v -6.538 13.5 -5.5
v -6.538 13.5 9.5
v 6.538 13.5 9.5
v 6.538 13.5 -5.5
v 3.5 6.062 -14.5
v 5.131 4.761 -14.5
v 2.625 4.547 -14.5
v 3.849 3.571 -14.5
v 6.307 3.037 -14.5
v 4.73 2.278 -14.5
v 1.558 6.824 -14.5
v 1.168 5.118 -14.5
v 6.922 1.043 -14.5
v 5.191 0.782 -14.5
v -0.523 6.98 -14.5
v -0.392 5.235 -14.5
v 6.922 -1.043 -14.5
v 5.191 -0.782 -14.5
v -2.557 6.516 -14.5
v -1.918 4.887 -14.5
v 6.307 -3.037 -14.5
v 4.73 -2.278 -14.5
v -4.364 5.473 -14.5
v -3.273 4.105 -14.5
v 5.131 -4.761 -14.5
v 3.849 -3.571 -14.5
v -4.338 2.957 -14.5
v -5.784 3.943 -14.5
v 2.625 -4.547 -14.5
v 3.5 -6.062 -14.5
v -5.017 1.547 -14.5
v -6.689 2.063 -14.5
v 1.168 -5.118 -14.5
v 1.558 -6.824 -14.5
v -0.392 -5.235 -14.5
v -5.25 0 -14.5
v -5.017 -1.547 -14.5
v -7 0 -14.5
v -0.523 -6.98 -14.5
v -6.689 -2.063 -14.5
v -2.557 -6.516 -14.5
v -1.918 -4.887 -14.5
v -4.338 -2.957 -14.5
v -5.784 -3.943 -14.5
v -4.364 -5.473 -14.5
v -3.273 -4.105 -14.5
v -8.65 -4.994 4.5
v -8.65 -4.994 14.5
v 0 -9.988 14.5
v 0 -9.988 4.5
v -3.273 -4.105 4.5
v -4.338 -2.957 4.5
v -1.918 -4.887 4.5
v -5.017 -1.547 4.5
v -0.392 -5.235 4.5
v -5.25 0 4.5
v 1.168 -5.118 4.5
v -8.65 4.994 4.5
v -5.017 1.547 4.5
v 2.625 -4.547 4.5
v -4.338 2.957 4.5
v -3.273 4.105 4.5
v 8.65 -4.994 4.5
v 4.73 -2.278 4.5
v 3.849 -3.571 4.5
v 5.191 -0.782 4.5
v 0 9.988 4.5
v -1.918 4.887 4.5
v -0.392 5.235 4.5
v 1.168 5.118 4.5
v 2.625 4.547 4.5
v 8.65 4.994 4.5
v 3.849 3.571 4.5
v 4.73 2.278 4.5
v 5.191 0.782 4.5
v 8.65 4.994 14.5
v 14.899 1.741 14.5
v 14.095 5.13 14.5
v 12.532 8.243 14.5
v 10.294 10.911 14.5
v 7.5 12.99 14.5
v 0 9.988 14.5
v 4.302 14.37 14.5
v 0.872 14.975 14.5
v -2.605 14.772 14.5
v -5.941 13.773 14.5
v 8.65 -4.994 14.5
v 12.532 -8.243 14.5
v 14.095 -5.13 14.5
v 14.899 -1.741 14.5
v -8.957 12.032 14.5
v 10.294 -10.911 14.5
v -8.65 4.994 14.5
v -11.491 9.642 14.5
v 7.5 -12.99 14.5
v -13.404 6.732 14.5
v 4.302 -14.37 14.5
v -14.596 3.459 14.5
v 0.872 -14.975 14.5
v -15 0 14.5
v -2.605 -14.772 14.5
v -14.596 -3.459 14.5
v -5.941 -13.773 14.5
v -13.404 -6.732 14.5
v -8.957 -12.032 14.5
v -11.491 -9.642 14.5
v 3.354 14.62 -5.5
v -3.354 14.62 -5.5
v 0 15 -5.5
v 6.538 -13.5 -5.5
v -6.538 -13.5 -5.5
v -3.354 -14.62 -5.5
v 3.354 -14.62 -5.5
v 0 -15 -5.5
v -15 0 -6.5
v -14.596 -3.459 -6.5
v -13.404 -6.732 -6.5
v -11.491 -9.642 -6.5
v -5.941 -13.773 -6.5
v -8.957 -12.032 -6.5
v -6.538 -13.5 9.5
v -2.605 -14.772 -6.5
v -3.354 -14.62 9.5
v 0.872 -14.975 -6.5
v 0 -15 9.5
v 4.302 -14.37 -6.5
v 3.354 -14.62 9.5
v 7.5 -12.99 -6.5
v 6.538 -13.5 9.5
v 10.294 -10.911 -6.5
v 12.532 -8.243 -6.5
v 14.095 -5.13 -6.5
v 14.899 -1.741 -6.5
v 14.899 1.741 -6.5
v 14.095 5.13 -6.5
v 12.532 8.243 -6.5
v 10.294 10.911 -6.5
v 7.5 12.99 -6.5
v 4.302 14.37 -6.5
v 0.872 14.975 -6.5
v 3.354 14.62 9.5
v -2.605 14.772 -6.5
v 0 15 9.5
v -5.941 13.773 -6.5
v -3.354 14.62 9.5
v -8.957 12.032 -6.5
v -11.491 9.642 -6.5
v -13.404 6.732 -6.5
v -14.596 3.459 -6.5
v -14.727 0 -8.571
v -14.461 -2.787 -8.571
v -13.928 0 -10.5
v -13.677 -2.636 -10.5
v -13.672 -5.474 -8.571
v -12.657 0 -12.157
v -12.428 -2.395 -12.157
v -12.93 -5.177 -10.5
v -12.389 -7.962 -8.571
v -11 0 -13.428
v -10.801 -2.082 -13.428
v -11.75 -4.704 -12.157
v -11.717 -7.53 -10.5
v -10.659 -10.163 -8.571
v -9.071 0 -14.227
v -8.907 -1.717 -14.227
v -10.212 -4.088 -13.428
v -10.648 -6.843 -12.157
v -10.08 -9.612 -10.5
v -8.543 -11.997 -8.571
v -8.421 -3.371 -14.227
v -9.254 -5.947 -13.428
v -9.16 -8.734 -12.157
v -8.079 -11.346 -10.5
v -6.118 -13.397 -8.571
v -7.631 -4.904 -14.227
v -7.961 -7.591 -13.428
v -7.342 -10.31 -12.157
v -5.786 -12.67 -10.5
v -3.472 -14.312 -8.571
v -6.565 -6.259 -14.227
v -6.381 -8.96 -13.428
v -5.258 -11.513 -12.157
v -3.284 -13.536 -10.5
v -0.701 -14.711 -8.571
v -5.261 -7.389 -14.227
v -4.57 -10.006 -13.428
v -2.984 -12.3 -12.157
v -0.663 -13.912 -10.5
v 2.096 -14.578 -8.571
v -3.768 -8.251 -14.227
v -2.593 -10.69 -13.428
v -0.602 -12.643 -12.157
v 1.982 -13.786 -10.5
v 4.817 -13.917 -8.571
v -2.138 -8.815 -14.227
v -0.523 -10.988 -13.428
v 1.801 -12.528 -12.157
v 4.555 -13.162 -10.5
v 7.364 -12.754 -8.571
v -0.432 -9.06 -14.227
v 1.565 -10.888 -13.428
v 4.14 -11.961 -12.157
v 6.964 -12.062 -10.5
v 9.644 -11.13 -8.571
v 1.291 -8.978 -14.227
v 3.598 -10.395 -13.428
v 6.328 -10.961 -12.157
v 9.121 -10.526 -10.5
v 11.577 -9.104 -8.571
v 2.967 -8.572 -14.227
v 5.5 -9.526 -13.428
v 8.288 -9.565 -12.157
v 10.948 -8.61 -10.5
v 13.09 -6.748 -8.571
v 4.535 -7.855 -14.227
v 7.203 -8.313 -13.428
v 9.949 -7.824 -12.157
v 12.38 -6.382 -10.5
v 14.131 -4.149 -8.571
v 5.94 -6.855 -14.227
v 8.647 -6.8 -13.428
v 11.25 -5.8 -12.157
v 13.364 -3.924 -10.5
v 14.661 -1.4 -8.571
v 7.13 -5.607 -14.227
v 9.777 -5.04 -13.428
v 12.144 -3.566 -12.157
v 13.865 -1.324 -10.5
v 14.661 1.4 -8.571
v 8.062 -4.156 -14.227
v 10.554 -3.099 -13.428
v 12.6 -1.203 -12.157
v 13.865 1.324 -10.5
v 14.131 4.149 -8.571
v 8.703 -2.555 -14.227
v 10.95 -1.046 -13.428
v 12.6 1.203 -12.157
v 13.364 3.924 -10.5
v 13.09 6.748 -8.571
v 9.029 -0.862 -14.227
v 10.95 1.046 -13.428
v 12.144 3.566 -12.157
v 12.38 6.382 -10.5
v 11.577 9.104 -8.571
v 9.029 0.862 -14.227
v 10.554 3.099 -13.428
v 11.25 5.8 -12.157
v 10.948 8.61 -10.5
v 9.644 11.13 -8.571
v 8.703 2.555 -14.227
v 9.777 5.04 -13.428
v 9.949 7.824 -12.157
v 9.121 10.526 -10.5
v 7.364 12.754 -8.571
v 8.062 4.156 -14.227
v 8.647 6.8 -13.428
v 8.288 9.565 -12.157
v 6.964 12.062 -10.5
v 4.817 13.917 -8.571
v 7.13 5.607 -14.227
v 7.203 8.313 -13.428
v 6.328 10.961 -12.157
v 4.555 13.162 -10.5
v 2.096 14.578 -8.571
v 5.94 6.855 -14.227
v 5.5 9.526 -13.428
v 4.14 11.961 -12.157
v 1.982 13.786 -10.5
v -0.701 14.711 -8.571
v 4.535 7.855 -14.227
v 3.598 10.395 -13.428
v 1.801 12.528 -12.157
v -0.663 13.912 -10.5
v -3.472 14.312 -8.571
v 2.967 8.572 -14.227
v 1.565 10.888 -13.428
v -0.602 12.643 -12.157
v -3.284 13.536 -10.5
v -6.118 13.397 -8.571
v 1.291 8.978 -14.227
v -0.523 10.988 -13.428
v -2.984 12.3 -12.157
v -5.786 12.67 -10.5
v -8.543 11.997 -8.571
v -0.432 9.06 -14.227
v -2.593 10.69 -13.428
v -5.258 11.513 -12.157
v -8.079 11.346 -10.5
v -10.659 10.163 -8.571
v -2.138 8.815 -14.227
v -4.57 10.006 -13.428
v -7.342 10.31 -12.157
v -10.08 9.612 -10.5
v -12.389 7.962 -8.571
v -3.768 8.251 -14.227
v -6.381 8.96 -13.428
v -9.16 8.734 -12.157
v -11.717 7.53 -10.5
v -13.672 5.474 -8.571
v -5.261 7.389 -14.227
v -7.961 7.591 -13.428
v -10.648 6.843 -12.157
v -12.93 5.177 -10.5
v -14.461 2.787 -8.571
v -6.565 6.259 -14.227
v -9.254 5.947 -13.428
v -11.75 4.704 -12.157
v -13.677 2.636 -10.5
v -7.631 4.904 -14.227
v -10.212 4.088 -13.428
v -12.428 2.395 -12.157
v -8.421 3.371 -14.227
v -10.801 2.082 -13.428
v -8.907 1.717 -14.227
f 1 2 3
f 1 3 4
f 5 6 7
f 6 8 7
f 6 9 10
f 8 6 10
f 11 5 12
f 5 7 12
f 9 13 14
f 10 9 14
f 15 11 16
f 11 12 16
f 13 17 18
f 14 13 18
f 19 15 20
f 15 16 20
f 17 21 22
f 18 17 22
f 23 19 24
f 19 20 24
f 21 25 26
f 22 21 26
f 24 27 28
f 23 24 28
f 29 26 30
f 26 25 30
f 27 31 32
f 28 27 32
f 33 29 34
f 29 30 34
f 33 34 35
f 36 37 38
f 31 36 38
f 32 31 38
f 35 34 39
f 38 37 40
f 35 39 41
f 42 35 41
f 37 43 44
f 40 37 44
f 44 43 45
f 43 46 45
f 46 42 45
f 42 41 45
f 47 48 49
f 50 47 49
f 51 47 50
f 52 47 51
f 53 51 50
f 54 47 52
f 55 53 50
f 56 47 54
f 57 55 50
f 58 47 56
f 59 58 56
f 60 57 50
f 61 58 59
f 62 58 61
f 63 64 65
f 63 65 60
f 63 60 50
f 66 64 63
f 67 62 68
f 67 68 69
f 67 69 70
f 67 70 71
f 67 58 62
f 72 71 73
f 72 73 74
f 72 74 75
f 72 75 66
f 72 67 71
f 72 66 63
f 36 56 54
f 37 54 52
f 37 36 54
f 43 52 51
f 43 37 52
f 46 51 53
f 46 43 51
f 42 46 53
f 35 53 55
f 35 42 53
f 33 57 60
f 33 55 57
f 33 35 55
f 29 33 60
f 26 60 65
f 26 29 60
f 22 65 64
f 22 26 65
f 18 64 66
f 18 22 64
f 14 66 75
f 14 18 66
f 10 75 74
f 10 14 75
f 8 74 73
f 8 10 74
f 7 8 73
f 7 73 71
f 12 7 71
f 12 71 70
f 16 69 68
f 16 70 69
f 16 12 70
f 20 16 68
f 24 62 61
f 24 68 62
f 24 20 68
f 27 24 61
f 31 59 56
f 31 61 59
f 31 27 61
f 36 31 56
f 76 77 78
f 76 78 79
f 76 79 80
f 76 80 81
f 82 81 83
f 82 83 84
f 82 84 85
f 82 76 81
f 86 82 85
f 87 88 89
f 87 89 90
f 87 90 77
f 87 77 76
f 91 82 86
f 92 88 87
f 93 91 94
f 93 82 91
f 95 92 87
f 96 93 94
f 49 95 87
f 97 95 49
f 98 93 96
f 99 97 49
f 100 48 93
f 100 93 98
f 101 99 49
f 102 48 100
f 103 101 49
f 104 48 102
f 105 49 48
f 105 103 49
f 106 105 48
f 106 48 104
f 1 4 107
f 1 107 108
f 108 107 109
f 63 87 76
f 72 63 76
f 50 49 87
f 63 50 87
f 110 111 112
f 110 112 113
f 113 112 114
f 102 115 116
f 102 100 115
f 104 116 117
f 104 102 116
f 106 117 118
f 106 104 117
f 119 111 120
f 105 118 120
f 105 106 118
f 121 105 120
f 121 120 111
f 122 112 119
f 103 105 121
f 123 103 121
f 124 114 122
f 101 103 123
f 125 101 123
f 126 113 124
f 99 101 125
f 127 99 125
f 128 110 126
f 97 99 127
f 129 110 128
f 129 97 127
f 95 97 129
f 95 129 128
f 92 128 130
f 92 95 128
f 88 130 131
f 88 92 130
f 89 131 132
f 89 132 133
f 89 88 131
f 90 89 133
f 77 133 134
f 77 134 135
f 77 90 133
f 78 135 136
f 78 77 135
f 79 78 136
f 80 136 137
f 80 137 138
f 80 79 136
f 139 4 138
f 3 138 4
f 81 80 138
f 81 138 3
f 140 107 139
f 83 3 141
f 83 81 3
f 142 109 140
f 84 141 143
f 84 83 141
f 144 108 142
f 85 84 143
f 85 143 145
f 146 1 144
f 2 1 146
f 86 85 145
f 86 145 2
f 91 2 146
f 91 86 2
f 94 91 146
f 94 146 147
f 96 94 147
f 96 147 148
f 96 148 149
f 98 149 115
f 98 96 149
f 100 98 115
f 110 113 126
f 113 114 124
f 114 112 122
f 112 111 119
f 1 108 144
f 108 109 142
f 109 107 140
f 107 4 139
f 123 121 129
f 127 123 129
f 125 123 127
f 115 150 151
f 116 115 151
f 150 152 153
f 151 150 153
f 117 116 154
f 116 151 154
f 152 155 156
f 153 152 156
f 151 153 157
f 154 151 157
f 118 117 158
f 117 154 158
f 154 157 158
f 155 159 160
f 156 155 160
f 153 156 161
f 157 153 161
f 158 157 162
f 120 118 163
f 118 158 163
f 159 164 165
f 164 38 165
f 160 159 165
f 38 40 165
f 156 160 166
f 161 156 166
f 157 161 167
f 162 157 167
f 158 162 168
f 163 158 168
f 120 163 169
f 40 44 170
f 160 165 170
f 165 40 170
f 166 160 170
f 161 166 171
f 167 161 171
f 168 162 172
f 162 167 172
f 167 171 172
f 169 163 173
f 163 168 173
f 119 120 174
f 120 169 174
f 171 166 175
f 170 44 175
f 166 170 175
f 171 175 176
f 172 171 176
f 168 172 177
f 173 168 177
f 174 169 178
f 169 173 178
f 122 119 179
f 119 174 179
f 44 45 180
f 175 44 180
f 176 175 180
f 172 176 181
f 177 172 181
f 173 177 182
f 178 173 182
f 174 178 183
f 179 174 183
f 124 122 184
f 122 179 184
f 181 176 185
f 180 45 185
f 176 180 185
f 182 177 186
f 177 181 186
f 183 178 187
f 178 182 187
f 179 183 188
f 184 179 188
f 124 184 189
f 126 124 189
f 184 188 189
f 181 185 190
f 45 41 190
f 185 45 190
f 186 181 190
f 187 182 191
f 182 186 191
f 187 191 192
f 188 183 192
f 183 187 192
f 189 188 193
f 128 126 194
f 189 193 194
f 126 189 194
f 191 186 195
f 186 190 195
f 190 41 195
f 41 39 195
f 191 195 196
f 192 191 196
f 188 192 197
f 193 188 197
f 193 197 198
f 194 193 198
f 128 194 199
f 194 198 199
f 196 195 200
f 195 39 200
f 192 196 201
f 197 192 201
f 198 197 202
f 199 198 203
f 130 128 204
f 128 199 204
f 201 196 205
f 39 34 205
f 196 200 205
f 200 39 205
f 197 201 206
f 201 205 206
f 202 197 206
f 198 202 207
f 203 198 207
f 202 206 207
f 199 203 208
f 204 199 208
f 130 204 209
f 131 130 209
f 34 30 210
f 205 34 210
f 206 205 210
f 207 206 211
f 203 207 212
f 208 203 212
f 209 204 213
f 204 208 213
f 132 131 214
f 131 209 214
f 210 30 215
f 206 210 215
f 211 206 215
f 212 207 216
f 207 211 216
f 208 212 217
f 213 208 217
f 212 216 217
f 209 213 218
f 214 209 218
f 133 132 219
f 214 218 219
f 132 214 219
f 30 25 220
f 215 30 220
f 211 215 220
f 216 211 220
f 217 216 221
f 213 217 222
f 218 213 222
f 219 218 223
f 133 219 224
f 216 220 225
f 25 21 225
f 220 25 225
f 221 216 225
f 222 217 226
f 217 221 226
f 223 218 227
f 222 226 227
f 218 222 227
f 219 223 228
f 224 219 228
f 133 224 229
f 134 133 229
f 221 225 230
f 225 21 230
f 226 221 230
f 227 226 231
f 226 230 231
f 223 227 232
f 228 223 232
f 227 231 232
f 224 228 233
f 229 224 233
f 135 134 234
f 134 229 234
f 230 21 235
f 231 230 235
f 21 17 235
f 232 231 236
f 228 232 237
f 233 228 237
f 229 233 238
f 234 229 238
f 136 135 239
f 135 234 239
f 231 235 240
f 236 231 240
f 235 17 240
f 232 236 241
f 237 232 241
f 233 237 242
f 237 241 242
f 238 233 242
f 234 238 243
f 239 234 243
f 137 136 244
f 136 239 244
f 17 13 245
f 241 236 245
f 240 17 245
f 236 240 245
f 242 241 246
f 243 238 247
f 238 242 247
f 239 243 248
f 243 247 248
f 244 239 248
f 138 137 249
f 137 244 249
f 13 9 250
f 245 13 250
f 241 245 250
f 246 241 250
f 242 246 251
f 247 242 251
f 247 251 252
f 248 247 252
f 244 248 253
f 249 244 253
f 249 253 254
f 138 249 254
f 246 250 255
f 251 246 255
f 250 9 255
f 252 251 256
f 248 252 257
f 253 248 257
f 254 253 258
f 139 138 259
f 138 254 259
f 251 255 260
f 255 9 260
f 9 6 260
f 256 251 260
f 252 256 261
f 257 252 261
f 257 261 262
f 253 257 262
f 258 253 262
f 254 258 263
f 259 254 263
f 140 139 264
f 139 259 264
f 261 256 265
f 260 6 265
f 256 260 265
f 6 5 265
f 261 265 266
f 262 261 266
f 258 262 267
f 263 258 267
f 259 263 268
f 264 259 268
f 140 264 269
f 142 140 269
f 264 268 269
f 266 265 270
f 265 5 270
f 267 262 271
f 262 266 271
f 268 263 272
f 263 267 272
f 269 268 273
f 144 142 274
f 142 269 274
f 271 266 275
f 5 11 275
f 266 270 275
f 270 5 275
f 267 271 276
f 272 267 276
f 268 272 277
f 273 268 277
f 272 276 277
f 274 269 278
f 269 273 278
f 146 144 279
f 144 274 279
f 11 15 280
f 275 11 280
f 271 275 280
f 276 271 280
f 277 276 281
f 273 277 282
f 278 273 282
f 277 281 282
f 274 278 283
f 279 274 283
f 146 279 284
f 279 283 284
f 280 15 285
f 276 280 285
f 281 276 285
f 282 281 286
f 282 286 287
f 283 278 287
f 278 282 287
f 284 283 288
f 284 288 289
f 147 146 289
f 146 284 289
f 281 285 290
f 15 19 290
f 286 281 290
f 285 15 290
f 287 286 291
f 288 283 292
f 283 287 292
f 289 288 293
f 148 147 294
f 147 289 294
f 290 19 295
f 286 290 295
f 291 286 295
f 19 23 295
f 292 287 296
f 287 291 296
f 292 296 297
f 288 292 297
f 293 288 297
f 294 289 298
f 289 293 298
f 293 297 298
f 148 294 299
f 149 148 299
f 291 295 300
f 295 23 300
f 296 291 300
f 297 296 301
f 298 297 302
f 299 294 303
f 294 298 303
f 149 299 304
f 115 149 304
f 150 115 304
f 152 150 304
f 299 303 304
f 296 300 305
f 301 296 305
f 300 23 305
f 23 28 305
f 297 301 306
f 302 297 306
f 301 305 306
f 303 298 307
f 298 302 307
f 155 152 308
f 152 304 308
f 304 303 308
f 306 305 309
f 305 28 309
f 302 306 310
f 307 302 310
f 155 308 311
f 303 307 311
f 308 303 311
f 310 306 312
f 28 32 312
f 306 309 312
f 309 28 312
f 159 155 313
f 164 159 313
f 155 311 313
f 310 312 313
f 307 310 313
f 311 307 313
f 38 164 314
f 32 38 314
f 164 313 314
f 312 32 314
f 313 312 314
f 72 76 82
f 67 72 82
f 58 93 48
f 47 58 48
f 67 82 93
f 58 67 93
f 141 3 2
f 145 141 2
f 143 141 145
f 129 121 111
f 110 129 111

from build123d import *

# Parameters (mm, degrees)
SKETCH_1_R               = 15
SKETCH_1_R_2             = 5.25
EXTRUDE_1_DEPTH          = 14.5
CUT_EXTRUDE_1_DEPTH      = 10
FILLET_2_R               = 8
CUT_EXTRUDE_2_DEPTH      = 26.695330315
CUT_EXTRUDE_2_DEPTH_BACK = 26.695330315
SKETCH_3_W               = 15
SKETCH_3_H               = 1.5


with BuildPart() as part:
    # 草图1 → 凸台-拉伸1 (new, symmetric)
    with BuildSketch(Plane.XY):
        with Locations(Location((0, 0, 0), (0, 0, 180))):
            Circle(SKETCH_1_R)
        with Locations(Location((0, 0, 0), (0, 0, 180))):
            Circle(SKETCH_1_R_2, mode=Mode.SUBTRACT)
    extrude(amount=EXTRUDE_1_DEPTH, both=True)

    # 草图2 → 切除-拉伸1 (cut)
    with BuildSketch(Plane.XY.offset(14.5)):
        Polygon((0, 9.988159657), (-8.65, 4.994079828), (-8.65, -4.994079828), (0, -9.988159657), (8.65, -4.994079828), (8.65, 4.994079828), align=None)
    extrude(amount=-CUT_EXTRUDE_1_DEPTH, mode=Mode.SUBTRACT)

    # 圆角2
    fillet_2_edges = [part.edges().sort_by_distance(p)[0] for p in [
        (15, 0, -14.5),
    ]]
    fillet(fillet_2_edges, radius=FILLET_2_R)

    # 草图3 → 切除-拉伸2 (cut, two sides: drawn at the far end of the back side and taken through both)
    with BuildSketch(Plane(origin=(0, 0, 0), x_dir=(0, 0, -1), z_dir=(1, 0, 0)).offset(-CUT_EXTRUDE_2_DEPTH_BACK)):
        with Locations((-2, 14.25)):
            Rectangle(SKETCH_3_W, SKETCH_3_H)
        with Locations((-2, -14.25)):
            Rectangle(SKETCH_3_W, SKETCH_3_H)
    extrude(amount=CUT_EXTRUDE_2_DEPTH + CUT_EXTRUDE_2_DEPTH_BACK, mode=Mode.SUBTRACT)


solid = part.part
